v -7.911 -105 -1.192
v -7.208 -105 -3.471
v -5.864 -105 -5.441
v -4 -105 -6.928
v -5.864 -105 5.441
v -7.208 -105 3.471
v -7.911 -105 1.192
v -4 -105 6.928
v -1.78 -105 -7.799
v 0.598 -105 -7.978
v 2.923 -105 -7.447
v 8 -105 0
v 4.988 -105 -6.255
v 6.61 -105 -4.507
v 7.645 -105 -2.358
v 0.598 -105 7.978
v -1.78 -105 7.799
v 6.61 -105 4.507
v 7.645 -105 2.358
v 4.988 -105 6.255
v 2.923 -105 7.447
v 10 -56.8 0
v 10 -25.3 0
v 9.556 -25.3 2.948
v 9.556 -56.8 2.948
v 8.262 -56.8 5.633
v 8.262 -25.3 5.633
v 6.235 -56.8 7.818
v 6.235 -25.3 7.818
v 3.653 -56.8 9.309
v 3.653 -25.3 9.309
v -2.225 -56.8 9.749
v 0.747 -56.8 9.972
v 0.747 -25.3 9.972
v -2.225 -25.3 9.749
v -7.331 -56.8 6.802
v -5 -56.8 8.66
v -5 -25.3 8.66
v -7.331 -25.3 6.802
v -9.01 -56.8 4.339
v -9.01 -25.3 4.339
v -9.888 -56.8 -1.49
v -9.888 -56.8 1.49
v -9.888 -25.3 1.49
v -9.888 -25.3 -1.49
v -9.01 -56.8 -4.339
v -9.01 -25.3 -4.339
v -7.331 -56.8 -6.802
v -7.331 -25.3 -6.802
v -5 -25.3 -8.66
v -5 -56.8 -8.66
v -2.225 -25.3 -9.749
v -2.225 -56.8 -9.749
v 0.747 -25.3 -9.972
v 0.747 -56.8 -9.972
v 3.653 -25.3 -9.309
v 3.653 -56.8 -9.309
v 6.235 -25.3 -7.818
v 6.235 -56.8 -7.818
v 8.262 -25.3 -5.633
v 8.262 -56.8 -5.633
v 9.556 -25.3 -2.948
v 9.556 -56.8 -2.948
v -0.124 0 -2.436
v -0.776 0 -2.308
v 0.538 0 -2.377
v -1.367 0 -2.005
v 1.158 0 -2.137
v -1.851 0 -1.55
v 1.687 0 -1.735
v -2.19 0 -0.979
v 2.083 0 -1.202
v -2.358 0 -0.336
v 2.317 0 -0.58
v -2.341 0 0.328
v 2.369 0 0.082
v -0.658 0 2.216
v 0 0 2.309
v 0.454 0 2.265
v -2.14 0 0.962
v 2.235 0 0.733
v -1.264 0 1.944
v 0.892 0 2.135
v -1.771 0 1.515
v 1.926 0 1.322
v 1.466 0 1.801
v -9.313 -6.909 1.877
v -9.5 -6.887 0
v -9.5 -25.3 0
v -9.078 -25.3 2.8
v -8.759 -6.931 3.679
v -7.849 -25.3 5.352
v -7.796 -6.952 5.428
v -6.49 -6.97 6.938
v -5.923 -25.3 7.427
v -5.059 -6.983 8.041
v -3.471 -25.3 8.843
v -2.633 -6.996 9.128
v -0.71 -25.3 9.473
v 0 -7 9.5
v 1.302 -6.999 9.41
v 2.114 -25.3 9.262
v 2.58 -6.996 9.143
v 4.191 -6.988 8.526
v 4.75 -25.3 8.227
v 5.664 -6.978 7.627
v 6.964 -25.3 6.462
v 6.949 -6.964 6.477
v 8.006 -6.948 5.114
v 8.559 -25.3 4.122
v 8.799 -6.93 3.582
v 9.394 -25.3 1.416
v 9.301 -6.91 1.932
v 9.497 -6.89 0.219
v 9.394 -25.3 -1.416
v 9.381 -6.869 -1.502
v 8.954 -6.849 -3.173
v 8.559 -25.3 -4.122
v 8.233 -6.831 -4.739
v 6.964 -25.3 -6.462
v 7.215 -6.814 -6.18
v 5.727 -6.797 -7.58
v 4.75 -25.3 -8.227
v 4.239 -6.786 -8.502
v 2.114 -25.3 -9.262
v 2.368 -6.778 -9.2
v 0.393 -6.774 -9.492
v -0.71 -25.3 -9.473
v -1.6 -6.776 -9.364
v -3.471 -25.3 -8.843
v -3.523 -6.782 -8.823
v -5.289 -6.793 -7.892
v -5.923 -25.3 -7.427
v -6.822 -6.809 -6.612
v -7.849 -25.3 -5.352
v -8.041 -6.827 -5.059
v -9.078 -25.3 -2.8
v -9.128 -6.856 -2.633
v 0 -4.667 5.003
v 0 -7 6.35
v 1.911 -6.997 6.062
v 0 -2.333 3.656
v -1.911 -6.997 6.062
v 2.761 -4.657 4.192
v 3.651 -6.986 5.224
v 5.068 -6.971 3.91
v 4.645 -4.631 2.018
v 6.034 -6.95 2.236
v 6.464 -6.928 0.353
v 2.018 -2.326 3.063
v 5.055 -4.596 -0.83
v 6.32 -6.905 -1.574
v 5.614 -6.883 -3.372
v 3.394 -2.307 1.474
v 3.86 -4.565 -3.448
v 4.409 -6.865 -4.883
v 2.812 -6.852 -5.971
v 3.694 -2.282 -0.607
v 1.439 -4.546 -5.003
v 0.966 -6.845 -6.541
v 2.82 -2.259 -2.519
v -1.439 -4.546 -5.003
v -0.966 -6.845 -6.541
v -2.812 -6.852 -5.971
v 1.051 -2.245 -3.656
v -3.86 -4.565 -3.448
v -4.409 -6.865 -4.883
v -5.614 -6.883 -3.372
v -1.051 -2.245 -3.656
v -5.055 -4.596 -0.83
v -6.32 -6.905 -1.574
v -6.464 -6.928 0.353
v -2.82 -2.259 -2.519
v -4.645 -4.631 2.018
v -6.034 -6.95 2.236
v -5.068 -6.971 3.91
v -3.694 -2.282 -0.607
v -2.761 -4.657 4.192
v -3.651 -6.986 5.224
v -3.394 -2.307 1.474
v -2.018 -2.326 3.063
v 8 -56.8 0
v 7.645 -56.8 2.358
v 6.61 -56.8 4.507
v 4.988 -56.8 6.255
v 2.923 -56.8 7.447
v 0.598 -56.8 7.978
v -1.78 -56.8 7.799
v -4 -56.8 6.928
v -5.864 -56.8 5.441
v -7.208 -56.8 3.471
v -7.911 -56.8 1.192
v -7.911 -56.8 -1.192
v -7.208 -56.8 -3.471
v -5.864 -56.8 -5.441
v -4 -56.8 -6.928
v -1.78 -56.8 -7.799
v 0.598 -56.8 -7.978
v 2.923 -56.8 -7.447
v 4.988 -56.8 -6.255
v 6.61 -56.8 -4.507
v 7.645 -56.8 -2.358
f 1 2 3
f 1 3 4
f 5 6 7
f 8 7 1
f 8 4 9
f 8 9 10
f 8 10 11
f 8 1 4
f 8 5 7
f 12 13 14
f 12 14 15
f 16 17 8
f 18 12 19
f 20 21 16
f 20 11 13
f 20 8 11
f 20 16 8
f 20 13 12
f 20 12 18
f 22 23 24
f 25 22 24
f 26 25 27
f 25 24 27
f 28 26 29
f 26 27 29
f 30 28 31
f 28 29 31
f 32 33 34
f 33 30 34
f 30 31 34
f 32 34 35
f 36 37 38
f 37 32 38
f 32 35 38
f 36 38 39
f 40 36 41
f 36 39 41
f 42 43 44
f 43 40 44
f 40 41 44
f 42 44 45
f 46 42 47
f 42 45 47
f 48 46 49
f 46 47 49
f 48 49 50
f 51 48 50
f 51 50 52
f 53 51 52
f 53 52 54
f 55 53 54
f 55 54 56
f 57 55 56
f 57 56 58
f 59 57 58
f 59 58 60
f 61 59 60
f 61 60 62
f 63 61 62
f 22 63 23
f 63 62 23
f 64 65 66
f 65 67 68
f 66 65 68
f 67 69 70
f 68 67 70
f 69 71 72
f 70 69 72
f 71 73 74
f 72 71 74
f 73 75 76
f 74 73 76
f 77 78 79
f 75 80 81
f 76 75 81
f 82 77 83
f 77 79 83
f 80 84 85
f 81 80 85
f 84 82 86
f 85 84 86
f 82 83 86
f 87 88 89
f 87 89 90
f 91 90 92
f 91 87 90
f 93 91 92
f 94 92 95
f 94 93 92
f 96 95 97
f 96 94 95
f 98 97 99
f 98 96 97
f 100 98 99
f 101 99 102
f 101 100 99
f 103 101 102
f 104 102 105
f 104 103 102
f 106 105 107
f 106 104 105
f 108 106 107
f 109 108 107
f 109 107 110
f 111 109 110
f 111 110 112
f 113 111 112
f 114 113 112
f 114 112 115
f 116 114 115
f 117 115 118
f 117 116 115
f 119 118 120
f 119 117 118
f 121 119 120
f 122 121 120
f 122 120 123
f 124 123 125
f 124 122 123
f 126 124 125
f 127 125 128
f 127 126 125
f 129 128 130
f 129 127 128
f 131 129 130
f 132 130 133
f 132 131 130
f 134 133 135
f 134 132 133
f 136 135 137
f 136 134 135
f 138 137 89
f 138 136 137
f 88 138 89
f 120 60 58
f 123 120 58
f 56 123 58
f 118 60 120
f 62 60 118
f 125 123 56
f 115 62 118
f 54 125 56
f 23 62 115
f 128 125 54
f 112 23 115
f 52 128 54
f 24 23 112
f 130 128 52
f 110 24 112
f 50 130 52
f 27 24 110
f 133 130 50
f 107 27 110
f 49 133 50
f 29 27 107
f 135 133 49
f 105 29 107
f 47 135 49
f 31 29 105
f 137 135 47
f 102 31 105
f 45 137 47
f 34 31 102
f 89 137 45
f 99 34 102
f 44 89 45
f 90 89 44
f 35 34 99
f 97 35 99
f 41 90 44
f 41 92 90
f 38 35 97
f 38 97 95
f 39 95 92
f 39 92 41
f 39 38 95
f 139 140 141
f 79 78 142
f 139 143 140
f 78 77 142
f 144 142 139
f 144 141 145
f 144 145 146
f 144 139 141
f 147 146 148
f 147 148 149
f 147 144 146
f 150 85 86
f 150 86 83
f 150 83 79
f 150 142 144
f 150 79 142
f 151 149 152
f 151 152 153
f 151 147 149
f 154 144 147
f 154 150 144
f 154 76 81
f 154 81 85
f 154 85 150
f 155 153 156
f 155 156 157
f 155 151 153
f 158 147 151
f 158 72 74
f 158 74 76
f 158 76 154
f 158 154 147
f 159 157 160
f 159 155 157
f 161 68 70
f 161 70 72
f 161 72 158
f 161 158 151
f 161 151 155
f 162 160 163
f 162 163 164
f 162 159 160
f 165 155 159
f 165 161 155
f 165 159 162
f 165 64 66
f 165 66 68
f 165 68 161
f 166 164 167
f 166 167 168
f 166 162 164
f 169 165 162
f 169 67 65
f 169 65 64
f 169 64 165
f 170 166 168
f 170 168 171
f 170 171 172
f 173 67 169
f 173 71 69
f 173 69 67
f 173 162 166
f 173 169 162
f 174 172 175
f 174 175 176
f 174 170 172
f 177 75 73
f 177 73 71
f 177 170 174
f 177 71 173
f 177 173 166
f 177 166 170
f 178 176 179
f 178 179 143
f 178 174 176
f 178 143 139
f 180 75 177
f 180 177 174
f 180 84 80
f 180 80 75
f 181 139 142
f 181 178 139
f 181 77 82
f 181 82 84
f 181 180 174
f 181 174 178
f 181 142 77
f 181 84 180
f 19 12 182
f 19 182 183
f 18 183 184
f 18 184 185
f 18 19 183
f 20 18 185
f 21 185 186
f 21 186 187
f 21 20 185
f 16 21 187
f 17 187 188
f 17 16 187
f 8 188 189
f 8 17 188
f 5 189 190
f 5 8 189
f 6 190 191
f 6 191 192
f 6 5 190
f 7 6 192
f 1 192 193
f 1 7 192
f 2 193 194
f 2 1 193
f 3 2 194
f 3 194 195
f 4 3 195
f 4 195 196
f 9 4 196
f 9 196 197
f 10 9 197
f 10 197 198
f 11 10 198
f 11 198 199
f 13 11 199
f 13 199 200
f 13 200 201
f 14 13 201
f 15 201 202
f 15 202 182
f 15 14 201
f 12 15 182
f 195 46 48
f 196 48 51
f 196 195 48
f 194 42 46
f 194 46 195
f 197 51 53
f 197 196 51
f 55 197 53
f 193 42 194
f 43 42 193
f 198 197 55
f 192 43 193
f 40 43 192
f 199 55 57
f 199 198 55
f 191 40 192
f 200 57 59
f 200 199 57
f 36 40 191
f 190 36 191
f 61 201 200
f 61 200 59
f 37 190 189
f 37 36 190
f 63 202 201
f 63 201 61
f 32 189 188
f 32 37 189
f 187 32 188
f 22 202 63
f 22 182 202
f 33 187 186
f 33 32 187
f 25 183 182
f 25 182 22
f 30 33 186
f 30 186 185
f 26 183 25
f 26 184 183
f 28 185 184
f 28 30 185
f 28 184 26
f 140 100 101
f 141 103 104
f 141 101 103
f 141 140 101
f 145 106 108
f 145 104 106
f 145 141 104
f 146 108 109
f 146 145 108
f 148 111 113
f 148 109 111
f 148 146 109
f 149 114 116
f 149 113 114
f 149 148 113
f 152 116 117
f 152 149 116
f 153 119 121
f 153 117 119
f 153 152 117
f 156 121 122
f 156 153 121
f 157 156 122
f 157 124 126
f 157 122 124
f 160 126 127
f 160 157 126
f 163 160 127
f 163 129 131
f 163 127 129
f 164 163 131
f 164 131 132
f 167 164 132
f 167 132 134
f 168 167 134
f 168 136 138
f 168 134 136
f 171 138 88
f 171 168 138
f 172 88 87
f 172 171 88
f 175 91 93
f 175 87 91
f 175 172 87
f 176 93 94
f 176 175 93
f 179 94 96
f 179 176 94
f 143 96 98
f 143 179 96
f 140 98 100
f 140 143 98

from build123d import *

# Parameters (mm, degrees)
F0_R     = 10
F1_DEPTH = 105
F2_R     = 15.829985
F2_R_2   = 9.5
F3_DEPTH = 25.3
F6_R     = 17.927182
F6_R_2   = 8
F7_DEPTH = 48.2


with BuildPart() as f1:
    # F0 (on Front) → F1 (new body)
    with BuildSketch(Plane.XZ):
        Circle(F0_R)
    extrude(amount=F1_DEPTH)

    # F2 (on face) → F3 (cut)
    with BuildSketch(Plane(origin=(0, 0, 0), x_dir=(-1, 0, 0), z_dir=(0, 1, 0))):
        Circle(F2_R)
        Circle(F2_R_2, mode=Mode.SUBTRACT)
    extrude(amount=-F3_DEPTH, mode=Mode.SUBTRACT)

    # F4 (on Right) → F5 (revolve, cut)
    with BuildSketch(Plane.YZ):
        Polygon((-7, 17.069709), (-7, 6.35), (3.998523, 0), (6.907294, 0.035041), (6.702085, 17.069709), align=None)
    revolve(axis=Axis((0, 5.452908, 0.01752), (0, 0.999927, 0.012046)), mode=Mode.SUBTRACT)

    # F6 (on face) → F7 (cut)
    with BuildSketch(Plane.XZ.offset(105)):
        Circle(F6_R)
        Circle(F6_R_2, mode=Mode.SUBTRACT)
    extrude(amount=-F7_DEPTH, mode=Mode.SUBTRACT)


solid = f1.part
